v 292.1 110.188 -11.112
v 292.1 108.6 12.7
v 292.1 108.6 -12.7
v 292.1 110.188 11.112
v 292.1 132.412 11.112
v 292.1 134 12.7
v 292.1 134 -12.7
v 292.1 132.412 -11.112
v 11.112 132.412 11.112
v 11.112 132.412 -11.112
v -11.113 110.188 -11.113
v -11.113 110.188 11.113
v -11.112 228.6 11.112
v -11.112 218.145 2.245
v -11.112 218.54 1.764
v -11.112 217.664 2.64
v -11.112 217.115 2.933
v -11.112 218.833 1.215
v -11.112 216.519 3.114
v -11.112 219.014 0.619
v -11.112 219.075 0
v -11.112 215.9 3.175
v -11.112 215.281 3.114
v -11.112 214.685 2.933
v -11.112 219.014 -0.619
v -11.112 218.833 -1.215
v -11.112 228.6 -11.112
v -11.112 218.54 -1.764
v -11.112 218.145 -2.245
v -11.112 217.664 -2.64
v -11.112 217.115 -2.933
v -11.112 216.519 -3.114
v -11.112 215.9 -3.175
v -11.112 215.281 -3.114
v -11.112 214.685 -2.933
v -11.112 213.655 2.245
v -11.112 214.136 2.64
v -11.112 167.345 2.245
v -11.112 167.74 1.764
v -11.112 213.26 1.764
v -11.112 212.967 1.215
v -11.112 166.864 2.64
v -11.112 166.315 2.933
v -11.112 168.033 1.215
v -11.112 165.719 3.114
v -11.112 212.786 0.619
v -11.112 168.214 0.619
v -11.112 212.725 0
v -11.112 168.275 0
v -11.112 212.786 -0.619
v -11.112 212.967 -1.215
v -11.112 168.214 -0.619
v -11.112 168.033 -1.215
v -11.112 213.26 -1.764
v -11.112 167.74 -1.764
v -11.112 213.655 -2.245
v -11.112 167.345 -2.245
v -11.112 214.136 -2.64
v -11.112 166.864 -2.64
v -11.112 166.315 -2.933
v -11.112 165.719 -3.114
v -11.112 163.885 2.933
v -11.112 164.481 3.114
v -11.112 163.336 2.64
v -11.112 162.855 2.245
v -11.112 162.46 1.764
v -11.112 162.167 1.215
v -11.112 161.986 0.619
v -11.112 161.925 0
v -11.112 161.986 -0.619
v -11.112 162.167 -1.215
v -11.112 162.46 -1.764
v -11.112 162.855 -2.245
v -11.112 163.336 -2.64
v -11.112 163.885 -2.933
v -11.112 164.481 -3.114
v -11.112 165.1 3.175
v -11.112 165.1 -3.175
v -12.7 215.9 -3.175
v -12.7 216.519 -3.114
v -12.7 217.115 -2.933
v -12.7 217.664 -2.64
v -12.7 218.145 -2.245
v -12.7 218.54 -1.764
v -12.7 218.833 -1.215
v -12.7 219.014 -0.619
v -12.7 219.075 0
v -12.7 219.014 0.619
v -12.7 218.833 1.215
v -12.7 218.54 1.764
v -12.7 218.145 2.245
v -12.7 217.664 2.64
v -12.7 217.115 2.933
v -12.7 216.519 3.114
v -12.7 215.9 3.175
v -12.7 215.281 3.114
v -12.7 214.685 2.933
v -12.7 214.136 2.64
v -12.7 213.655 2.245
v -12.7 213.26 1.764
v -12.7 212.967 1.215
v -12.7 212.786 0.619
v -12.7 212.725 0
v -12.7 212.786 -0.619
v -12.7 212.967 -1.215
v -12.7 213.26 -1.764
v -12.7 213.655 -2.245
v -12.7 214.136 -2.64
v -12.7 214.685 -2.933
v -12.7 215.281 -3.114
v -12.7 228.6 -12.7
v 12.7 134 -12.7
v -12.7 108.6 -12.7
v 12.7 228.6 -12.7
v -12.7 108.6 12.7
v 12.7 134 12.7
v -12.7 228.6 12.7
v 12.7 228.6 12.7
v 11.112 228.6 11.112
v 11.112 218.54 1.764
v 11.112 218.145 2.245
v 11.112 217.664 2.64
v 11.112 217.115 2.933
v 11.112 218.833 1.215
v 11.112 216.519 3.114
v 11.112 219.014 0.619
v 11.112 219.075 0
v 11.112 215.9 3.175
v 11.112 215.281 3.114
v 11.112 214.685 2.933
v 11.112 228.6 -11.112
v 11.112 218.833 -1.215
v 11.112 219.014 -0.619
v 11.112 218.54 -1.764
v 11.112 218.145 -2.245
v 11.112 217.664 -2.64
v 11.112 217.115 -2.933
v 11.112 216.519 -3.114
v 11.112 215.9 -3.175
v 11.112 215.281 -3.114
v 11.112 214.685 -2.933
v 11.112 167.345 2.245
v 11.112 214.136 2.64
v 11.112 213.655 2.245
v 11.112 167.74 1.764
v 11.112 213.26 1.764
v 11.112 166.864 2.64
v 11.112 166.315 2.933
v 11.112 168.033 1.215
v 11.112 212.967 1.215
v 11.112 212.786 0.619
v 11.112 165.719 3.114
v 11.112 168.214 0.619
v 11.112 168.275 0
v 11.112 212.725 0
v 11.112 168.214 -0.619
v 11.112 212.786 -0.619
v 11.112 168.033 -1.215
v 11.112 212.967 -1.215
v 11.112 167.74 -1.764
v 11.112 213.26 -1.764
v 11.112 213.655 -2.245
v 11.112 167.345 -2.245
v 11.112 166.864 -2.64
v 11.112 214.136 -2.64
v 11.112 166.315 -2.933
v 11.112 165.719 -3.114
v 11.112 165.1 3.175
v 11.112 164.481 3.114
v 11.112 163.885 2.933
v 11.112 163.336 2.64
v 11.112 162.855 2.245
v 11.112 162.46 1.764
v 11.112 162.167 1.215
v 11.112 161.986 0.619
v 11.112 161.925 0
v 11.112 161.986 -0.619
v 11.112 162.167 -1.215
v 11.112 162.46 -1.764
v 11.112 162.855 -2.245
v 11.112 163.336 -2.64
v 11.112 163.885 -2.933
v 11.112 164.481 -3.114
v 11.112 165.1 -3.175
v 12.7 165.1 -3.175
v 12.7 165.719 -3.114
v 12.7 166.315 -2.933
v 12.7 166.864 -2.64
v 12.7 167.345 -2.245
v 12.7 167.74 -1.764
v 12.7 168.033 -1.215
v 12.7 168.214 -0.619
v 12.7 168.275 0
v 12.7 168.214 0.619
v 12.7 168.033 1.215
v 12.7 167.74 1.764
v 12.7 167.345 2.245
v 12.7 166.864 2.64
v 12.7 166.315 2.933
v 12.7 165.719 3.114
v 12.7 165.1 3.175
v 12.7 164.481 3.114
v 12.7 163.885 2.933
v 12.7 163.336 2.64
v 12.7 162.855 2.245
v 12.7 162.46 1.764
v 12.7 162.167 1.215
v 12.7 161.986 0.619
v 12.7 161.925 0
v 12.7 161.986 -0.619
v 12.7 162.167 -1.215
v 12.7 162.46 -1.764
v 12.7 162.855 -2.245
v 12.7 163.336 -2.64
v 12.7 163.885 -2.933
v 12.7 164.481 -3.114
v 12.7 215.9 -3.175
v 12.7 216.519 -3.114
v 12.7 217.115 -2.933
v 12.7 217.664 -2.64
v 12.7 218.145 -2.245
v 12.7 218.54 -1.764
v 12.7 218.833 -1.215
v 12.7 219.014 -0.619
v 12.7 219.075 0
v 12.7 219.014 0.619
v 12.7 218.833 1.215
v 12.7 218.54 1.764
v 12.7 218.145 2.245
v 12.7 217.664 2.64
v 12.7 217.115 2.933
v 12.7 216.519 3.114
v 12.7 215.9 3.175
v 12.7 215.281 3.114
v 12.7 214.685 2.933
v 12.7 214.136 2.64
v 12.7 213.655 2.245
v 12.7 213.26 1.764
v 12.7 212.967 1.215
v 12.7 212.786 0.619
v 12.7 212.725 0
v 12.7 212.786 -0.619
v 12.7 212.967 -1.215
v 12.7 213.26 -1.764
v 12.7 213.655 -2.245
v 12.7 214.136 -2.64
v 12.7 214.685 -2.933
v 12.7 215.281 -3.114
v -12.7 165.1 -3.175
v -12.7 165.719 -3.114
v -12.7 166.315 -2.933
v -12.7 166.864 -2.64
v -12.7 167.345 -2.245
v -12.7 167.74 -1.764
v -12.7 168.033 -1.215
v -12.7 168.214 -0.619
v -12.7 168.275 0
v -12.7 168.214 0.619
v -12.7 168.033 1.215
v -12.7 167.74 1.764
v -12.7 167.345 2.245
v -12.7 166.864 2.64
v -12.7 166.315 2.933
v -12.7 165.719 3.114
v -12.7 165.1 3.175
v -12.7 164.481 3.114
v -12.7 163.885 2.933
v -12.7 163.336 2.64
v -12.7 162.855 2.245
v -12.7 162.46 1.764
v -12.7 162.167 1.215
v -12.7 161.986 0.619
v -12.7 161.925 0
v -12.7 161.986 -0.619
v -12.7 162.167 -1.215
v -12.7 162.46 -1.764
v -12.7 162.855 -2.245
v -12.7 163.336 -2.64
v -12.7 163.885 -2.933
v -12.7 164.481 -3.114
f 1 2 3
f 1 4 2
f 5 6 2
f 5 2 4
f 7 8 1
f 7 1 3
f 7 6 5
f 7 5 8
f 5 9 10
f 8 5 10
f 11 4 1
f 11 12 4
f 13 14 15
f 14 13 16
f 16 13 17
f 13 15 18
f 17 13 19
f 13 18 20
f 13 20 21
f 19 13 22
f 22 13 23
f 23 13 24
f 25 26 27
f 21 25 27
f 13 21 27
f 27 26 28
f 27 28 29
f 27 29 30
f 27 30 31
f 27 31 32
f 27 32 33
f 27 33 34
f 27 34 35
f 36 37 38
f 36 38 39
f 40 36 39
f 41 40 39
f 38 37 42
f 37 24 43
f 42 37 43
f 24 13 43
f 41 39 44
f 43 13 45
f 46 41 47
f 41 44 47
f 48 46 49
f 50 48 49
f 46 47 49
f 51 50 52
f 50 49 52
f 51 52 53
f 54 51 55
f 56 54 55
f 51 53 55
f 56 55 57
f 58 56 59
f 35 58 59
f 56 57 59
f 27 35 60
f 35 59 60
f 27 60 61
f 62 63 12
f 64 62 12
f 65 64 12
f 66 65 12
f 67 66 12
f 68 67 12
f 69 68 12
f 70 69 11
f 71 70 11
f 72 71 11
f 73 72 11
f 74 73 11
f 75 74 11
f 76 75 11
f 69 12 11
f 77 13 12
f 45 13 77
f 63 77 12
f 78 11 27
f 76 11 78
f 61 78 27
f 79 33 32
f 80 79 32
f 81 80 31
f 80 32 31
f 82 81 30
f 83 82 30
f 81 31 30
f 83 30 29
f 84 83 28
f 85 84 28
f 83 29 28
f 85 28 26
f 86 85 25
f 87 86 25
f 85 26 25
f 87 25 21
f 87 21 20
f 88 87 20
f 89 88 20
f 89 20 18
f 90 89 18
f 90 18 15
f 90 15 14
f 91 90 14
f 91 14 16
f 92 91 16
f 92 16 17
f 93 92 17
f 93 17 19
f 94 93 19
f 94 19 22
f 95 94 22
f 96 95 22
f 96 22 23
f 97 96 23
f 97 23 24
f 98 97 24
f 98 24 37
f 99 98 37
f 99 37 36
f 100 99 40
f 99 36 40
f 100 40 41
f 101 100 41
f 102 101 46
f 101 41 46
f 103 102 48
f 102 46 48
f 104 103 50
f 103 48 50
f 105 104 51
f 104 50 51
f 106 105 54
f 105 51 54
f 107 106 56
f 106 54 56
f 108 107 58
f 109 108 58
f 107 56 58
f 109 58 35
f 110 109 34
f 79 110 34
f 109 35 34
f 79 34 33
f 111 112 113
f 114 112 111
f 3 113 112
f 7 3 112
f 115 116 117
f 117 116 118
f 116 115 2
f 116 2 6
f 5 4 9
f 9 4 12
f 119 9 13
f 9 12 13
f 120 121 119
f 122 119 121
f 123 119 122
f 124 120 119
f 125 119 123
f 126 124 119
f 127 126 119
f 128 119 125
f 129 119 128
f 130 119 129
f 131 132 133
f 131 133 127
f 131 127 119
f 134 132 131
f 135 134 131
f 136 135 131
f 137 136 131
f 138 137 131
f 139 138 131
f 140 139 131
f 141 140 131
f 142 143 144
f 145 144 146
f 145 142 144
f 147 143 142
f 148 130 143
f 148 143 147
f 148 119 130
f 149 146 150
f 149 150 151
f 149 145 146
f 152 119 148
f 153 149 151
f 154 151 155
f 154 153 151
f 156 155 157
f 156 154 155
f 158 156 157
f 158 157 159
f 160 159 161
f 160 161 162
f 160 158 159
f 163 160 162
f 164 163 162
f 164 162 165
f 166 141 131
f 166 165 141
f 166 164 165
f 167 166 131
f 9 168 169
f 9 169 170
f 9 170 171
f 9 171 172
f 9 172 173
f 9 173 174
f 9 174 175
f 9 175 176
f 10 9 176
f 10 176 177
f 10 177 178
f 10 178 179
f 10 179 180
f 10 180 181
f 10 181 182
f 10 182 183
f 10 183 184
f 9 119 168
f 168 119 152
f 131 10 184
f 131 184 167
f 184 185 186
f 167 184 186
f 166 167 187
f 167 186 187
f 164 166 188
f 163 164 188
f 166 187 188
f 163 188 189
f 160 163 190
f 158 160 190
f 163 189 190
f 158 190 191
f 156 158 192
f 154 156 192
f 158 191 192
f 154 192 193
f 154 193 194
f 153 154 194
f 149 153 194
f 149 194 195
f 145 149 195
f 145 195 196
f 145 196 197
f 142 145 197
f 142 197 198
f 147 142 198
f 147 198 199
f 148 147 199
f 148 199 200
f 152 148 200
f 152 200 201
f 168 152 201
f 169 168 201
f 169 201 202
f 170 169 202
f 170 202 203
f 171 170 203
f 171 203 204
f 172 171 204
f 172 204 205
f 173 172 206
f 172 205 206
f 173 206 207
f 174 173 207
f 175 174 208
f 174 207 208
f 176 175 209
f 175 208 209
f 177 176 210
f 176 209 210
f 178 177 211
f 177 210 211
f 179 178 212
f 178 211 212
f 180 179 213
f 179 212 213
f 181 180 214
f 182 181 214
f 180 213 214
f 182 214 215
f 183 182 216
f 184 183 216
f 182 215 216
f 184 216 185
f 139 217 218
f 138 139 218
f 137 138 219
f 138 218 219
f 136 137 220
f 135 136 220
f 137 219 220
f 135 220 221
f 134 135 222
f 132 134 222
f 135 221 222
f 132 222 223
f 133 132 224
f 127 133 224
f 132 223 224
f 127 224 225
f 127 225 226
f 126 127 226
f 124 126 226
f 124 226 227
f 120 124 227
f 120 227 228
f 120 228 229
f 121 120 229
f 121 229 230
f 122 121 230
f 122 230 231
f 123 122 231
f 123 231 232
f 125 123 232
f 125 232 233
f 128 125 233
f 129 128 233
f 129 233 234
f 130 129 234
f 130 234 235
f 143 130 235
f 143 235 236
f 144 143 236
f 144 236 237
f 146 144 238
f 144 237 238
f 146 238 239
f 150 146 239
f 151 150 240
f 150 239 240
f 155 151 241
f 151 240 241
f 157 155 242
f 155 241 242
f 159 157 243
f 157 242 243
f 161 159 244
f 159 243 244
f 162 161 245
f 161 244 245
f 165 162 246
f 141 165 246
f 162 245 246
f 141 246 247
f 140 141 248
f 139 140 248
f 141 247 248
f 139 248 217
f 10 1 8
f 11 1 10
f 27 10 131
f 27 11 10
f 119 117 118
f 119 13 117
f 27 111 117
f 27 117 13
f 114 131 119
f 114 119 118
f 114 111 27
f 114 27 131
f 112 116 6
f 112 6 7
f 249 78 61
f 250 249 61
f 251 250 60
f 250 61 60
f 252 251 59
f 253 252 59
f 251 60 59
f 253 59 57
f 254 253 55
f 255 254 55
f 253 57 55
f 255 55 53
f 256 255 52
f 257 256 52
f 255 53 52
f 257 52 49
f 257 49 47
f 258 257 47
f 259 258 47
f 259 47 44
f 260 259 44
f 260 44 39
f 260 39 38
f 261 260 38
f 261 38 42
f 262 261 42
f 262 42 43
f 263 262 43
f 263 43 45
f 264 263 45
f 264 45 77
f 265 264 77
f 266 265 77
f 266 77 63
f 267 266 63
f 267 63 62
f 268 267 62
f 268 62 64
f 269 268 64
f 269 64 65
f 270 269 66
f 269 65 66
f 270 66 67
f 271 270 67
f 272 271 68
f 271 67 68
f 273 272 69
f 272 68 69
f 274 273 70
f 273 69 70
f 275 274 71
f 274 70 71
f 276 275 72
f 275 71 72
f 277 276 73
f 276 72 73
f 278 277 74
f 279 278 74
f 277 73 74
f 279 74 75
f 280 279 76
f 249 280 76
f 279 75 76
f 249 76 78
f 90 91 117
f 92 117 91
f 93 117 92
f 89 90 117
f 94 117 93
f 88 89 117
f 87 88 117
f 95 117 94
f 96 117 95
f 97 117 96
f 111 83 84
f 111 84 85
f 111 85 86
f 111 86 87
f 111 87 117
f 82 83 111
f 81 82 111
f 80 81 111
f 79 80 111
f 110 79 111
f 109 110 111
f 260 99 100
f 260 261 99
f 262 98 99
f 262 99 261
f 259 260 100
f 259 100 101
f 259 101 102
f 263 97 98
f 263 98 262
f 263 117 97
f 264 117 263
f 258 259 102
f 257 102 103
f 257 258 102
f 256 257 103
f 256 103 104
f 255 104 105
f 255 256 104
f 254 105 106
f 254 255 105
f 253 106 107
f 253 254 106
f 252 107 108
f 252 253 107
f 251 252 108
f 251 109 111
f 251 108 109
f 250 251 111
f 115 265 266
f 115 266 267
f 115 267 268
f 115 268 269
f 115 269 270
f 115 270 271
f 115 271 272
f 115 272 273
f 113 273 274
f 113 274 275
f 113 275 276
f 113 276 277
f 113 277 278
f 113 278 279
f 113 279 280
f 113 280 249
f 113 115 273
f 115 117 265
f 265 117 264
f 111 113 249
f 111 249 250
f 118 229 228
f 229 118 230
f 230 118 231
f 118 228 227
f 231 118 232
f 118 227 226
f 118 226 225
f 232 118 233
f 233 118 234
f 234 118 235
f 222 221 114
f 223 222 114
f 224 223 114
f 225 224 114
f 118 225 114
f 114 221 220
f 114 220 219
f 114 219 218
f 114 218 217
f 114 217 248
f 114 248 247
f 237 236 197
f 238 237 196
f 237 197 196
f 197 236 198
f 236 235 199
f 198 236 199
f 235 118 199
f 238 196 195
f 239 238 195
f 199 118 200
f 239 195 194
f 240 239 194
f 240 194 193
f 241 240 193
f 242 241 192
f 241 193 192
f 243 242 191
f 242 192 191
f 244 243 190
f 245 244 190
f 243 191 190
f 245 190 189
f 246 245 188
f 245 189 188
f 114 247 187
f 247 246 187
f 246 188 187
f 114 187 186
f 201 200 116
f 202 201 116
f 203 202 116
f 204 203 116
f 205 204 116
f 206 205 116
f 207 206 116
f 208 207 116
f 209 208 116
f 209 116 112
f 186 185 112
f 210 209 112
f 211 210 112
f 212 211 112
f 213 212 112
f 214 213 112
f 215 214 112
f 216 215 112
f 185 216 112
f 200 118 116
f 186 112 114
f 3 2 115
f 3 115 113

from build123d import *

# Parameters (mm, degrees)
SKETCH1_W                       = 25.4
SKETCH1_H                       = 25.4
SKETCH1_W_2                     = 22.225
SKETCH1_H_2                     = 22.225
BOSS_EXTRUDE1_DEPTH             = 228.6
SKETCH2_R                       = 3.175
CUT_EXTRUDE1_DEPTH              = 231.35713577
SKETCH3_R                       = 3.175
CUT_EXTRUDE2_DEPTH              = 231.35713577
CUT_EXTRUDE3_DEPTH              = 231.35713577
SKETCH6_W                       = 25.4
SKETCH6_H                       = 25.4
SKETCH6_W_2                     = 22.225
SKETCH6_H_2                     = 22.225
BOSS_EXTRUDE3_DEPTH             = 279.4
BOSS_EXTRUDE3_DIRECTION_2_REACH = 232.357


with BuildPart() as part:
    # Sketch1 → Boss-Extrude1 (new body)
    with BuildSketch(Plane(origin=(0, 0, 0), x_dir=(1, 0, 0), z_dir=(0, 1, 0))):
        Rectangle(SKETCH1_W, SKETCH1_H)
        Rectangle(SKETCH1_W_2, SKETCH1_H_2, mode=Mode.SUBTRACT)
    extrude(amount=BOSS_EXTRUDE1_DEPTH)

    # Sketch2 → Cut-Extrude1 (cut, through all)
    with BuildSketch(Plane(origin=(12.7, 0, 0), x_dir=(0, 0, -1), z_dir=(1, 0, 0))):
        with Locations((0, 215.9)):
            Circle(SKETCH2_R)
        with Locations((0, 165.1)):
            Circle(SKETCH2_R)
    extrude(amount=-CUT_EXTRUDE1_DEPTH, mode=Mode.SUBTRACT)

    # Sketch3 → Cut-Extrude2 (cut, through all)
    with BuildSketch(Plane.XY.offset(12.7)):
        with Locations((0, 69.85)):
            Circle(SKETCH3_R)
        with Locations((0, 19.05)):
            Circle(SKETCH3_R)
    extrude(amount=-CUT_EXTRUDE2_DEPTH, mode=Mode.SUBTRACT)

    # Sketch4 → Cut-Extrude3 (cut, through all)
    with BuildSketch(Plane.XY.offset(12.7)):
        Polygon((-12.7, 0), (-12.7, 108.6), (12.7, 134), (12.7, 0), align=None)
    extrude(amount=-CUT_EXTRUDE3_DEPTH, mode=Mode.SUBTRACT)

    # Sketch6 → Boss-Extrude3 (add)
    with BuildSketch(Plane(origin=(12.7, 0, 0), x_dir=(0, 0, -1), z_dir=(1, 0, 0))):
        with Locations((0, 121.3)):
            Rectangle(SKETCH6_W, SKETCH6_H)
        with Locations((0, 121.3)):
            Rectangle(SKETCH6_W_2, SKETCH6_H_2, mode=Mode.SUBTRACT)
    extrude(amount=BOSS_EXTRUDE3_DEPTH)

    # Sketch6 → Boss-Extrude3 direction 2 (add, up to next)
    with BuildSketch(Plane(origin=(12.7, 0, 0), x_dir=(0, 0, -1), z_dir=(1, 0, 0)), mode=Mode.PRIVATE) as boss_extrude3_direction_2_sk1:
        with Locations((0, 121.3)):
            Rectangle(SKETCH6_W, SKETCH6_H)
        with Locations((0, 121.3)):
            Rectangle(SKETCH6_W_2, SKETCH6_H_2, mode=Mode.SUBTRACT)
    boss_extrude3_direction_2_tool1 = extrude(boss_extrude3_direction_2_sk1.sketch, amount=-BOSS_EXTRUDE3_DIRECTION_2_REACH, mode=Mode.PRIVATE) - part.part
    add(boss_extrude3_direction_2_tool1.solids().sort_by_distance((12.7, 121.3, 12.34079))[0])


solid = part.part
